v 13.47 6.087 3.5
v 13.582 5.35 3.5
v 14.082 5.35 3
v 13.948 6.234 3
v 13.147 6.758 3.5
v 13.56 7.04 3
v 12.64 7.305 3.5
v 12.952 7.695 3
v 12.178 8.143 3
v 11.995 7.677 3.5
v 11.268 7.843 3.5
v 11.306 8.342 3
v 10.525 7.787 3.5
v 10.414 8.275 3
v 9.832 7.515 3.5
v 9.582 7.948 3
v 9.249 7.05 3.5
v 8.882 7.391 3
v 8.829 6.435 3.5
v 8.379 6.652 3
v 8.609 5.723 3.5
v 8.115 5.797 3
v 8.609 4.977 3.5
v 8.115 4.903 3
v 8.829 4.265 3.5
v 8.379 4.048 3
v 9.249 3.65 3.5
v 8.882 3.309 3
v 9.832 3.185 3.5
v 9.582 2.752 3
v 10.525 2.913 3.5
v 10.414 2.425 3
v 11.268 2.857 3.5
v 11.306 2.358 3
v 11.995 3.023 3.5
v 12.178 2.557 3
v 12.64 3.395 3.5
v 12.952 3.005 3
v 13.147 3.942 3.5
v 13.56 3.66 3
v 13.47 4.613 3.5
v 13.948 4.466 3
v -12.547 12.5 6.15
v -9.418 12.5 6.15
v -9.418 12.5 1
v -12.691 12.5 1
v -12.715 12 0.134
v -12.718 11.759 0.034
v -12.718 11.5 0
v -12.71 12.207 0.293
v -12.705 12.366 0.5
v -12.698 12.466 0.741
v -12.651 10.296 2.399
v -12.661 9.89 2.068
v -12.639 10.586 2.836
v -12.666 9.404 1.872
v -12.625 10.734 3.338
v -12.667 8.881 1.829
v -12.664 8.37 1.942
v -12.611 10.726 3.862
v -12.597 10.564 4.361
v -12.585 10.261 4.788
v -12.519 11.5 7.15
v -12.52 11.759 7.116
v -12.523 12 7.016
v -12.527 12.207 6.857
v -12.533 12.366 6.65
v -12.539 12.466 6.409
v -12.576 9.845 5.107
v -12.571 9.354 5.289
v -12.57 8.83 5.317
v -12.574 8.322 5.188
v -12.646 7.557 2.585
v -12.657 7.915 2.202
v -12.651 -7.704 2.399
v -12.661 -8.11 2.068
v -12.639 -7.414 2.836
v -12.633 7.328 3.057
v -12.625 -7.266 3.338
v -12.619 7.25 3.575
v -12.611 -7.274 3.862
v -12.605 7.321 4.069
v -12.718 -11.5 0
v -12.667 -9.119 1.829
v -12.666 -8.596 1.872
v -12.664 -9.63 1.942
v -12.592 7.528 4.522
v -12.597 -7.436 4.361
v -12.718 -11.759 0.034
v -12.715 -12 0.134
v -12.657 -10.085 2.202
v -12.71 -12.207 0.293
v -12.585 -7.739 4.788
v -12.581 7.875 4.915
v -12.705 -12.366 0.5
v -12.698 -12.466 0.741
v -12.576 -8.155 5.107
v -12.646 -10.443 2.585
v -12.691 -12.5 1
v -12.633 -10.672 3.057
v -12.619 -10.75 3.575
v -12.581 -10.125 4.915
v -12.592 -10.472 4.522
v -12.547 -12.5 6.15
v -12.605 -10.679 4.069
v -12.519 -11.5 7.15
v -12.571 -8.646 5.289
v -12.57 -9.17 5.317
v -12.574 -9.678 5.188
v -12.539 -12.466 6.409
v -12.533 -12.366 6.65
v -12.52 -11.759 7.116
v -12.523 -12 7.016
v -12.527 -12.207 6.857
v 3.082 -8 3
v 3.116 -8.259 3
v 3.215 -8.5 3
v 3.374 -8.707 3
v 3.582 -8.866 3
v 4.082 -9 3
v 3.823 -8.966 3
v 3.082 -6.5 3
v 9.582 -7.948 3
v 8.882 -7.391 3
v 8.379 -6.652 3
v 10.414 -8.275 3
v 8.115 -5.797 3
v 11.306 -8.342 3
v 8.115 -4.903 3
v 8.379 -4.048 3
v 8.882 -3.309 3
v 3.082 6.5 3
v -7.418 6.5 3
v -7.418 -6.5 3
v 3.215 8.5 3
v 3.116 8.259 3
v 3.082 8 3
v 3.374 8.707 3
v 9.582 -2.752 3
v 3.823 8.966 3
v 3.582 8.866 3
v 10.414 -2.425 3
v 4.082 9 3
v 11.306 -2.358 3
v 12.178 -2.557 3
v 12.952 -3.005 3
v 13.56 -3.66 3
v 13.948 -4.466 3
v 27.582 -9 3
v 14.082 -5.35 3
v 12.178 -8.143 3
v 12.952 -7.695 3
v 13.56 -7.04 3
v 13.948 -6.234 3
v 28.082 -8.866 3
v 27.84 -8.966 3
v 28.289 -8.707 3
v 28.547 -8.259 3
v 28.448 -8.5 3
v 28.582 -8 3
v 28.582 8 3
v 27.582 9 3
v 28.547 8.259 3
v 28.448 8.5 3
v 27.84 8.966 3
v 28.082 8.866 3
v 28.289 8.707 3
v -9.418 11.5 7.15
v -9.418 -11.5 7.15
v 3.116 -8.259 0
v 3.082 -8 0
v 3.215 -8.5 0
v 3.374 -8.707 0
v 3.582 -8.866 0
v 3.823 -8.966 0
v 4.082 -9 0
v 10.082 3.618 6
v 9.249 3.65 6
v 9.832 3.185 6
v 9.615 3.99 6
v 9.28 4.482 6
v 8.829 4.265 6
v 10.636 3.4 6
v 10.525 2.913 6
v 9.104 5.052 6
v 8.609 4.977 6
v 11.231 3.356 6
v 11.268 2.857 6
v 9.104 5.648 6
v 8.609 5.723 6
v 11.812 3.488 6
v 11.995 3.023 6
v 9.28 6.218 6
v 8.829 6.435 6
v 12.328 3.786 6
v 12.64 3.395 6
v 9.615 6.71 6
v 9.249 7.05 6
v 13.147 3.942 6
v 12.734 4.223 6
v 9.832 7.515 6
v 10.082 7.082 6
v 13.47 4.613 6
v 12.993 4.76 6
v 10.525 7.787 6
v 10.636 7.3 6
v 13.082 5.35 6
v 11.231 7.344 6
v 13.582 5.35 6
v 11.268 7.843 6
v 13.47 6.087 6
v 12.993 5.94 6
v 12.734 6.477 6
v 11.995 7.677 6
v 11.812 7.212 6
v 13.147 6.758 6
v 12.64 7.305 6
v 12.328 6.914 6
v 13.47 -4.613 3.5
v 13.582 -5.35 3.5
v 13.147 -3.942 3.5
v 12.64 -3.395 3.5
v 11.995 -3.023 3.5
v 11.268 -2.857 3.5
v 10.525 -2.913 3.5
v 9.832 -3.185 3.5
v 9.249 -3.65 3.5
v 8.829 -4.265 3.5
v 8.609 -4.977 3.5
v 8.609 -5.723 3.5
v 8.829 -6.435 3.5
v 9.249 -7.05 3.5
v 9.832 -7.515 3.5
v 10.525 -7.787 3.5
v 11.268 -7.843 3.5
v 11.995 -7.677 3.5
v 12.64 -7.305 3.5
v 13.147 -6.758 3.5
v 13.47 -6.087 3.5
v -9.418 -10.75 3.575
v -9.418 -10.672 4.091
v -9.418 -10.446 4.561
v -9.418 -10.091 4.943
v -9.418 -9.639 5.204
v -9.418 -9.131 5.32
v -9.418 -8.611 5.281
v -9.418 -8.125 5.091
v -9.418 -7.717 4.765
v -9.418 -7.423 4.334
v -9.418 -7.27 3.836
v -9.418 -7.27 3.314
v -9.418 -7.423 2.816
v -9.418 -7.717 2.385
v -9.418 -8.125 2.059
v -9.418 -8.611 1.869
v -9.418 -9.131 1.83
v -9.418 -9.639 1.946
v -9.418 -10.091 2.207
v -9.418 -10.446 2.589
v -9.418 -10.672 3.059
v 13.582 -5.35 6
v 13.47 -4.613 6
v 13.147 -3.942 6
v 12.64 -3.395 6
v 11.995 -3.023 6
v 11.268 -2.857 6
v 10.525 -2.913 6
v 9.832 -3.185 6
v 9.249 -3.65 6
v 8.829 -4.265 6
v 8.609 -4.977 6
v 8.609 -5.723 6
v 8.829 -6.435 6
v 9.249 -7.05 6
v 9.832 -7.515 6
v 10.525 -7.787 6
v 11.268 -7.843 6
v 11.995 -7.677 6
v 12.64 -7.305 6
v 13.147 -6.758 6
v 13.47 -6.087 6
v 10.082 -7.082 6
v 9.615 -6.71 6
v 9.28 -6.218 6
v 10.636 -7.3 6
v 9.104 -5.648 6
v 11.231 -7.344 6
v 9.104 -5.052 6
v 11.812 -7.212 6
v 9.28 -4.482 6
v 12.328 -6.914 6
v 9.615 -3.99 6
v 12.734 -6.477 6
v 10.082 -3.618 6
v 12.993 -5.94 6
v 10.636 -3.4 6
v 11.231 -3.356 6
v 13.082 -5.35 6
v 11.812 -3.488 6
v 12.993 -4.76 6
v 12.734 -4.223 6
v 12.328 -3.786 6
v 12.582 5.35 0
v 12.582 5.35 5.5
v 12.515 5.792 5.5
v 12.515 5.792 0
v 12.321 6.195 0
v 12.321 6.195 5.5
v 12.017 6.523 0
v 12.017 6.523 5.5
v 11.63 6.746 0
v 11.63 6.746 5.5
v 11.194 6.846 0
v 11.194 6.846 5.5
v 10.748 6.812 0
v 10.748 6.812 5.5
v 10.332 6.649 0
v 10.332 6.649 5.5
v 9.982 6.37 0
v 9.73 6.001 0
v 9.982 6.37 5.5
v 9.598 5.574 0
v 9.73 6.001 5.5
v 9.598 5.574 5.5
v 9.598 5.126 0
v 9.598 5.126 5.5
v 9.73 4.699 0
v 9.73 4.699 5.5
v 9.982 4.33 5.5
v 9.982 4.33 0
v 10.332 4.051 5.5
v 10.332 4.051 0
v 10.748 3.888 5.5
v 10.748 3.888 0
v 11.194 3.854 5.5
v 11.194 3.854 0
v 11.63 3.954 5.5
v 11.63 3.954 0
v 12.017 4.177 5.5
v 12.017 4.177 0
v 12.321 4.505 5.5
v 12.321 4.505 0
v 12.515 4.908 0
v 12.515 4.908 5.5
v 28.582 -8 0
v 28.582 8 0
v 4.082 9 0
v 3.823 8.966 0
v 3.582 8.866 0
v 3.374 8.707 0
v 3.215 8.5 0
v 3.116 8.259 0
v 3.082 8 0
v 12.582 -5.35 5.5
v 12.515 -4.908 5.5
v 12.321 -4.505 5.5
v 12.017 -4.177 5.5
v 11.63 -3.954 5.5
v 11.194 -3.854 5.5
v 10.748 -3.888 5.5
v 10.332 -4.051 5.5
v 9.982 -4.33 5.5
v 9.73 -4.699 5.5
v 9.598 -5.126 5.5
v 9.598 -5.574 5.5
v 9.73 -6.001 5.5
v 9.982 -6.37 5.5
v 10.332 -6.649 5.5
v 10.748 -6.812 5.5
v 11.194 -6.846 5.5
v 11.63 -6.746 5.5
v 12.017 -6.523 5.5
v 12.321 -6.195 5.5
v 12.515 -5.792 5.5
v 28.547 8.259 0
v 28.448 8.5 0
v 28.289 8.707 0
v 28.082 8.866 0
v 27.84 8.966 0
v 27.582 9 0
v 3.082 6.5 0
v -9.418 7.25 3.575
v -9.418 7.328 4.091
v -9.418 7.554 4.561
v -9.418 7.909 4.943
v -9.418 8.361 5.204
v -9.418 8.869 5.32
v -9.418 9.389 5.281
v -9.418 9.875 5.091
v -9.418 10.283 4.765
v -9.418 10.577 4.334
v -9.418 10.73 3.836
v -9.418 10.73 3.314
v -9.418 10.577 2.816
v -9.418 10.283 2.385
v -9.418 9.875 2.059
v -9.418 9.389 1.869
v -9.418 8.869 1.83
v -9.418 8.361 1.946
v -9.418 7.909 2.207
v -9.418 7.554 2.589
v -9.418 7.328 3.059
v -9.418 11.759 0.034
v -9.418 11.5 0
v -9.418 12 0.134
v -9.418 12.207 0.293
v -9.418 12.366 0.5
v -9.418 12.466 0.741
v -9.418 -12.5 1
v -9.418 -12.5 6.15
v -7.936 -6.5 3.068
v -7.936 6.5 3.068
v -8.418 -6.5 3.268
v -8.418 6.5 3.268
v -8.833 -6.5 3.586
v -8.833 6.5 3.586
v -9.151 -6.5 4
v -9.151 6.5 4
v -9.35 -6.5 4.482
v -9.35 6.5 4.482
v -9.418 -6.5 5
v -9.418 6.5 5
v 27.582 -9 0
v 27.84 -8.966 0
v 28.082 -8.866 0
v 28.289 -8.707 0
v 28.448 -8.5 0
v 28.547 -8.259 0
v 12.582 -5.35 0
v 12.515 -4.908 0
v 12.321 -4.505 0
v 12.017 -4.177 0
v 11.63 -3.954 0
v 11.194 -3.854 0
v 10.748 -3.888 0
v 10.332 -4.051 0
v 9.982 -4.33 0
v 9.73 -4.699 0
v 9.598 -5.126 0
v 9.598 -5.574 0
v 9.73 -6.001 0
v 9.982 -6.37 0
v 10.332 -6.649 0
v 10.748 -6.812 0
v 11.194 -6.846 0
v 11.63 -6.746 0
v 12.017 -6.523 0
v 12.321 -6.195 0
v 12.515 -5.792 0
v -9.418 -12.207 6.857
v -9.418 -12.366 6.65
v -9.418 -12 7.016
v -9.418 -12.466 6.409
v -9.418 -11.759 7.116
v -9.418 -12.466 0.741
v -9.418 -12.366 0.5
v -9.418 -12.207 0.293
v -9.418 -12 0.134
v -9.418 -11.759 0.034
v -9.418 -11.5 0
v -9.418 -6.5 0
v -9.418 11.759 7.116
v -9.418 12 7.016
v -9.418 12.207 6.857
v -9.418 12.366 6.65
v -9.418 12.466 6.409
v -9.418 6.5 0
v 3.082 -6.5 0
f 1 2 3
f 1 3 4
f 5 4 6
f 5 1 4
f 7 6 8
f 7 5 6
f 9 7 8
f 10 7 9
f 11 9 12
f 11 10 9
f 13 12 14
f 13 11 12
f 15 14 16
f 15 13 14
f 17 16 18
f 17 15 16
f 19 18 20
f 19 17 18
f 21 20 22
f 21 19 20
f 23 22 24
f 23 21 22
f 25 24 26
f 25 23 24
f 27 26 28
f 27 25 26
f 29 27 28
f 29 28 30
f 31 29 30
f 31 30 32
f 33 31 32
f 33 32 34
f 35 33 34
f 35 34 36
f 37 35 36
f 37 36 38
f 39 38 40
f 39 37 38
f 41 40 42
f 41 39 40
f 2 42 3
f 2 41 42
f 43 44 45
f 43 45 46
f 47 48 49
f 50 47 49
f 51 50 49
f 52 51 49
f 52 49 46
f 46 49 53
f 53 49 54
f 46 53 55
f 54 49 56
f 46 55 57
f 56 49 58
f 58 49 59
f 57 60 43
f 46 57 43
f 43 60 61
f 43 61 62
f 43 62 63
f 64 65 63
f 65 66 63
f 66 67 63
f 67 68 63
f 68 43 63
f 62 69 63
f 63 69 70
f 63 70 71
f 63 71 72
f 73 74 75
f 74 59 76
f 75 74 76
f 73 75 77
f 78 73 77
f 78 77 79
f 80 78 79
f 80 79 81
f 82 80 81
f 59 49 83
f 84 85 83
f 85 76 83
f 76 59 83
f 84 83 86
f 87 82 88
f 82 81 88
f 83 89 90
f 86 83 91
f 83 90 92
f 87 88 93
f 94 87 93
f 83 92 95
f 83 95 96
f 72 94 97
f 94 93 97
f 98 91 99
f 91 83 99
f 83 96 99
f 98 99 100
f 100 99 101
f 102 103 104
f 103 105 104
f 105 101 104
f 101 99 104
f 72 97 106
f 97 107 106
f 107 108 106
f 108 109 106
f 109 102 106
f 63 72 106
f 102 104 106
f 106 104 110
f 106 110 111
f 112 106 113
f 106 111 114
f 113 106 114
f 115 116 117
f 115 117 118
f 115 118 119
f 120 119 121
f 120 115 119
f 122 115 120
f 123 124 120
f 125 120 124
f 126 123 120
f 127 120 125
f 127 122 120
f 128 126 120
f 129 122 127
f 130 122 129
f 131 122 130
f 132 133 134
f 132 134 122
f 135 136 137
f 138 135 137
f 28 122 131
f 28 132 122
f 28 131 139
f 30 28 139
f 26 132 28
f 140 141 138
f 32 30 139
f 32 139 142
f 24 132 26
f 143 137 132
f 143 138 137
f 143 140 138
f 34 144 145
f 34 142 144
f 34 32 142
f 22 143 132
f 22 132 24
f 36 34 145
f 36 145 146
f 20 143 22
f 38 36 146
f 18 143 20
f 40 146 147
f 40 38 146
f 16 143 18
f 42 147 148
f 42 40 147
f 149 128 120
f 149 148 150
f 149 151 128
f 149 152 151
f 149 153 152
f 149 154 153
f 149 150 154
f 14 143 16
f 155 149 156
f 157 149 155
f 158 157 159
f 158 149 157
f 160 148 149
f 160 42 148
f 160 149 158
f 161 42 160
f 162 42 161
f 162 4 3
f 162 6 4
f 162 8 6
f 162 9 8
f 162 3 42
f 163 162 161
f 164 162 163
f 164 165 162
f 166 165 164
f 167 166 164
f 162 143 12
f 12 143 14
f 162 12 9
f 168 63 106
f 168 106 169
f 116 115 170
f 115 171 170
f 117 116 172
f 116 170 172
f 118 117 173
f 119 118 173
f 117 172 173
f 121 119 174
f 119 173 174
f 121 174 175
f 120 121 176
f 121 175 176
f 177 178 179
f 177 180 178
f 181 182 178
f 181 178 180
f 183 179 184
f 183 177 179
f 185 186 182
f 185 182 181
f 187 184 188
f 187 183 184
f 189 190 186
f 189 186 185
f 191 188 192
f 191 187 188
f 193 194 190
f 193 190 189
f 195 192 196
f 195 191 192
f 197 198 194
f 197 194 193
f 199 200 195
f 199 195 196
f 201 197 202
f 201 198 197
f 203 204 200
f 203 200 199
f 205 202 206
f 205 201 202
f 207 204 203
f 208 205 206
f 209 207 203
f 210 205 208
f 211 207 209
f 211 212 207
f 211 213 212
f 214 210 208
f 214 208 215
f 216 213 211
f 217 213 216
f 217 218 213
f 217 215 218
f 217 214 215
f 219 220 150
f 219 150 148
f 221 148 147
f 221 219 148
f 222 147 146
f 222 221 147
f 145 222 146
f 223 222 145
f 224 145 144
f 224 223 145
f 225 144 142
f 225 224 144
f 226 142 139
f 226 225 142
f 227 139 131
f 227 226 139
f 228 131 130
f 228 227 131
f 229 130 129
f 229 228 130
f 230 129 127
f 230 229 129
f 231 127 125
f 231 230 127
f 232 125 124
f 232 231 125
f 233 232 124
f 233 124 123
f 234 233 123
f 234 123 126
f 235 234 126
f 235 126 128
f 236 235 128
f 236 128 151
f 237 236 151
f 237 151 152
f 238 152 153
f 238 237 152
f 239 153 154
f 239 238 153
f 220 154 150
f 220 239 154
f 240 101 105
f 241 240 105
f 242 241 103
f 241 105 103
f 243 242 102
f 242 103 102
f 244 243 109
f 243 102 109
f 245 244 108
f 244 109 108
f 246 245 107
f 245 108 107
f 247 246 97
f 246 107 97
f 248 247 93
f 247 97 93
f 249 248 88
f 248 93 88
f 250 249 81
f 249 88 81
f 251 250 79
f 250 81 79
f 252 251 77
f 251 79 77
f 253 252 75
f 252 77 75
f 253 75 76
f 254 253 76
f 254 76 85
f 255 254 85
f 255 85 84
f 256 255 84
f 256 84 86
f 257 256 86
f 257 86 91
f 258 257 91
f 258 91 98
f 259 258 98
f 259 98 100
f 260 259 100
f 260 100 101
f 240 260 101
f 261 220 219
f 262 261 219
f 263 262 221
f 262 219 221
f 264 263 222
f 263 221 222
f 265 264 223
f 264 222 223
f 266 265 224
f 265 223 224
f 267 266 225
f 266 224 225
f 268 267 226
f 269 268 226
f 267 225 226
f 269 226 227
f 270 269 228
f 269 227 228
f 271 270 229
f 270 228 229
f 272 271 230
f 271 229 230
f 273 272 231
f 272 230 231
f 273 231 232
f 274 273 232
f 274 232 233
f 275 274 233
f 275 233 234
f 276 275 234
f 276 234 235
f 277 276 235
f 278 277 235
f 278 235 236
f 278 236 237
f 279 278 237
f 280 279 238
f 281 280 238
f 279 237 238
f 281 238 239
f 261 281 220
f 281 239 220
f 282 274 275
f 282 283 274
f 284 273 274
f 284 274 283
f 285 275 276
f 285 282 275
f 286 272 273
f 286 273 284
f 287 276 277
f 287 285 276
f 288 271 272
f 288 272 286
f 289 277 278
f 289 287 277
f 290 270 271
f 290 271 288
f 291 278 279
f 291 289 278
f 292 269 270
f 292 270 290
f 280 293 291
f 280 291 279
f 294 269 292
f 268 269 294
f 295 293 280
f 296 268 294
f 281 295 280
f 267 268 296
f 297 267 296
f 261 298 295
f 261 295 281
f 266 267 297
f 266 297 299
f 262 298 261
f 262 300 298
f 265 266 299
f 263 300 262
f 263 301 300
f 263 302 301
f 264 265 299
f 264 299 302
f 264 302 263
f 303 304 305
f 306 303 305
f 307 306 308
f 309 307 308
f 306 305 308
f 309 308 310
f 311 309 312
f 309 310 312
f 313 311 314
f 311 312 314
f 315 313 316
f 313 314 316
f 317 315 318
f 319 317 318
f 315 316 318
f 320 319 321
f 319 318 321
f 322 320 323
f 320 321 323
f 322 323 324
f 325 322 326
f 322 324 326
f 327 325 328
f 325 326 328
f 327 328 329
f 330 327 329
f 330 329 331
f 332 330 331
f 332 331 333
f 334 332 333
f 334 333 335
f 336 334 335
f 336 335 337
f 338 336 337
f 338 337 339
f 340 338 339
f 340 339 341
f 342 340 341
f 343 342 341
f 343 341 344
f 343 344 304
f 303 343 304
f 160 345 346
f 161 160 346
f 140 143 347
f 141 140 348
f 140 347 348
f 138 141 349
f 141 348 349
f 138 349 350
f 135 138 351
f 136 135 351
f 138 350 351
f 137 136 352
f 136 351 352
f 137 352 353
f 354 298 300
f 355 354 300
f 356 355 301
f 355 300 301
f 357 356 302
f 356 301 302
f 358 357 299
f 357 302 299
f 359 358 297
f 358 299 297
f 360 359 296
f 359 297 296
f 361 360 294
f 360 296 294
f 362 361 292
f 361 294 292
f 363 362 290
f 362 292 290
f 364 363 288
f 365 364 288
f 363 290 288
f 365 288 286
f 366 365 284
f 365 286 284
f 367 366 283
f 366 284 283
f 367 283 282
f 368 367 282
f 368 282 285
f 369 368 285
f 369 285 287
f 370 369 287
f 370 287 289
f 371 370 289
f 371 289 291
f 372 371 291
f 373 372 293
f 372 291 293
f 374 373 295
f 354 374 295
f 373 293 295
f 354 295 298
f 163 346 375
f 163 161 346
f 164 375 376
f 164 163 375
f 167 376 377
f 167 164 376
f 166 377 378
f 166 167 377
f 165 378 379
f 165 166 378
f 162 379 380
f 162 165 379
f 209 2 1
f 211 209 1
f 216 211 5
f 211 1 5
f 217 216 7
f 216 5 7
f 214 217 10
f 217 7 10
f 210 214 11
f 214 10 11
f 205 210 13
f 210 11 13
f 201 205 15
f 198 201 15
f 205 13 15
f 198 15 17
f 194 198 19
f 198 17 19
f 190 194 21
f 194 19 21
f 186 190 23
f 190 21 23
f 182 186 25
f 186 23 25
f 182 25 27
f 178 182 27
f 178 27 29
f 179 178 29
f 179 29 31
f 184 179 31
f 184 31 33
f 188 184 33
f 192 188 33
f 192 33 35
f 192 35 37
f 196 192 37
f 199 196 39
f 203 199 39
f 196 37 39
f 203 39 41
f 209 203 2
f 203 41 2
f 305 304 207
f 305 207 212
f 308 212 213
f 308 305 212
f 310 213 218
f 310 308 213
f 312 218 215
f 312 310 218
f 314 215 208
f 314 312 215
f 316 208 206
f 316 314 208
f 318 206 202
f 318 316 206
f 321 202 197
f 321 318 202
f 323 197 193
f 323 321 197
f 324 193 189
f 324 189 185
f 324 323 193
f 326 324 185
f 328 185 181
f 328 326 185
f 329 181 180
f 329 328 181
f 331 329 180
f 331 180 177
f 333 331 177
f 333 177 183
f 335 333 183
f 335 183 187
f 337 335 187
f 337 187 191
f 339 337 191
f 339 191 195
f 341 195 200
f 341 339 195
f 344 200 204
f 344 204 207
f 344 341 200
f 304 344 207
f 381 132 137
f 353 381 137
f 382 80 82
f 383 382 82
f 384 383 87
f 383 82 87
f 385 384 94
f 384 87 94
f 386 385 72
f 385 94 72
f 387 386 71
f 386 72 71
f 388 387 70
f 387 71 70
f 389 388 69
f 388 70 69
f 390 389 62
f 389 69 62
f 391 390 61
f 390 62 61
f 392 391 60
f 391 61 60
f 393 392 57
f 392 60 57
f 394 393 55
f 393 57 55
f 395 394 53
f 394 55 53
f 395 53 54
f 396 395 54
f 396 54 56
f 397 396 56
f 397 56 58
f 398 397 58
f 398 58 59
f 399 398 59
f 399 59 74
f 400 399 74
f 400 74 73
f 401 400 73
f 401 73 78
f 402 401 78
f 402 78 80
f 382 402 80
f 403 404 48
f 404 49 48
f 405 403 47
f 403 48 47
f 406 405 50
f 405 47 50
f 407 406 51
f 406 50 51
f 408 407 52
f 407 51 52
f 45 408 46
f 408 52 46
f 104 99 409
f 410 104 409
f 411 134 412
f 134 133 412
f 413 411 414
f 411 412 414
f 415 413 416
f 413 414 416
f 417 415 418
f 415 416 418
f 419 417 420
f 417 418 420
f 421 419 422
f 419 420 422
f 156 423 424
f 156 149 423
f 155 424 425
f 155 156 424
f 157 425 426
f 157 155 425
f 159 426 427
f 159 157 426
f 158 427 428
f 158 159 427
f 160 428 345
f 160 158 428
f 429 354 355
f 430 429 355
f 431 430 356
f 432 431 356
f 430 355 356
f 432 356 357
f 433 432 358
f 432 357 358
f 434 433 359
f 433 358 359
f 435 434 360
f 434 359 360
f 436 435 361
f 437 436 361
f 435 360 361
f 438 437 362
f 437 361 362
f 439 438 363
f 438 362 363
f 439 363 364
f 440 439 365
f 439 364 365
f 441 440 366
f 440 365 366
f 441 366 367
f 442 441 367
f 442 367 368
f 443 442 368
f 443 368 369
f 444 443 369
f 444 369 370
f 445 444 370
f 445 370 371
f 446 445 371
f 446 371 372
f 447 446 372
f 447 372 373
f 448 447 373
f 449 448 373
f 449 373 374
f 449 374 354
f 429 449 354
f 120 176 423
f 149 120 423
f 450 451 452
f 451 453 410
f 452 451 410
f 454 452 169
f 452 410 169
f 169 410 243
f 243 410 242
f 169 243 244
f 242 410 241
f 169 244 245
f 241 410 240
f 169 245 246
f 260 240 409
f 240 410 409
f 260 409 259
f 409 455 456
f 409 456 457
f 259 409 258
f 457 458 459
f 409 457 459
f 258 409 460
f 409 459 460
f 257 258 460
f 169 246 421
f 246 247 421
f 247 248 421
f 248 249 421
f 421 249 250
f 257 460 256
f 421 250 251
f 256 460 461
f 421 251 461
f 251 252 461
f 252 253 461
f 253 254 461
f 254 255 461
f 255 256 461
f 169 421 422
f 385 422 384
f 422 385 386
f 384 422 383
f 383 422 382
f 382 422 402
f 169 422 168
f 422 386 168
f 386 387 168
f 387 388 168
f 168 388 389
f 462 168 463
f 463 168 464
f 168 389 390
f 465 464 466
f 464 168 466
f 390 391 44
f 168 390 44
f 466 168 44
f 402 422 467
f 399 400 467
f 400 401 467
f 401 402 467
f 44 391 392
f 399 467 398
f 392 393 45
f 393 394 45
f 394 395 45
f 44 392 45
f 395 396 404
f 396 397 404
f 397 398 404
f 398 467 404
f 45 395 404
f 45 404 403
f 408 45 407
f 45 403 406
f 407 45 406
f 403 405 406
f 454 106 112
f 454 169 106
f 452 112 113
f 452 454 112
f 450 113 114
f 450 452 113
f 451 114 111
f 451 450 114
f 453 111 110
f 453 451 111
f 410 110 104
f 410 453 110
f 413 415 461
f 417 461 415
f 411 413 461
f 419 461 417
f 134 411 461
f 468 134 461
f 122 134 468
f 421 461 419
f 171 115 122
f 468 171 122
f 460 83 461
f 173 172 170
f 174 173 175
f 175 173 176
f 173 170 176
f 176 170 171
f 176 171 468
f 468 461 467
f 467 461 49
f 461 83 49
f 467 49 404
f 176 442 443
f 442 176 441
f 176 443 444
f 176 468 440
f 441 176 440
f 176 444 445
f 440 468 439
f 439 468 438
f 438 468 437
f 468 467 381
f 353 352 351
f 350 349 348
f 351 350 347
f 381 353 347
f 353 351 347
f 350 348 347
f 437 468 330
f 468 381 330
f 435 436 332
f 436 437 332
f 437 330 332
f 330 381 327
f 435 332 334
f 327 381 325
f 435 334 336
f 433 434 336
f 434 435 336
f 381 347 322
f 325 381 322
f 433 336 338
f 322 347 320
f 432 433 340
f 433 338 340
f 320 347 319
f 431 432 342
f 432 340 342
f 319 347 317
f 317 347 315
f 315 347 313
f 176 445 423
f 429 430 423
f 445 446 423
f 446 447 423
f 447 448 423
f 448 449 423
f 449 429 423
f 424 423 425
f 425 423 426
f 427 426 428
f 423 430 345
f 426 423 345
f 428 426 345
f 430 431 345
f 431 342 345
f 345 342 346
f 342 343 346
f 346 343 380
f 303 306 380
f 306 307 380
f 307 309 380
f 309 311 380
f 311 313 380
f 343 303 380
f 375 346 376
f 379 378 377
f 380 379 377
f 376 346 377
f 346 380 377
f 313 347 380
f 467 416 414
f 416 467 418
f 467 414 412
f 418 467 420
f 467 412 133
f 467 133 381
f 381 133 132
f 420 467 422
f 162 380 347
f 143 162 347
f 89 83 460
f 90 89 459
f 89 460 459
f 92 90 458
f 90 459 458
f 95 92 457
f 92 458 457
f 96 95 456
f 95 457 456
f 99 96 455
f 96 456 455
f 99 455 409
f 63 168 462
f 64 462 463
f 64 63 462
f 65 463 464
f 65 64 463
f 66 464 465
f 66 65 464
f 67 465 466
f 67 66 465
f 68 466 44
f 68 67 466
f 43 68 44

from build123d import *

# Parameters (mm, degrees)
PAD006_DEPTH    = 7.15
SKETCH012_W     = 38
SKETCH012_H     = 18
POCKET004_DEPTH = 4.15
SKETCH013_R     = 2.5
PAD007_DEPTH    = 3
SKETCH014_R     = 1.5
POCKET005_DEPTH = 6.001
SKETCH016_W     = 12.5
SKETCH016_H     = 2.5
POCKET006_DEPTH = 5
SKETCH017_R     = 1.75
POCKET007_DEPTH = 5
CHAMFER_SIZE    = 0.5
CHAMFER001_SIZE = 0.5
POCKET008_DEPTH = 25.001
FILLET_R        = 2
FILLET001_R     = 1
FILLET002_R     = 1


with BuildPart() as part:
    # Sketch011 (on XY_Plane001 of Origin002) → Pad006 (new body)
    with BuildSketch(Plane.XY):
        Polygon((-9.418493, -9), (28.581507, -9), (28.581507, 9), (-9.418493, 9), (-9.418493, 12.5), (-12.718493, 12.5), (-12.718493, -12.5), (-9.418493, -12.5), align=None)
    extrude(amount=PAD006_DEPTH)

    # Sketch012 (on Face10 of Pad006) → Pocket004 (cut)
    with BuildSketch(Plane.XY.offset(7.15)):
        with Locations((9.581507, 0)):
            Rectangle(SKETCH012_W, SKETCH012_H)
    extrude(amount=-POCKET004_DEPTH, mode=Mode.SUBTRACT)

    # Sketch013 (on Face4 of Pocket004) → Pad007 (join)
    with BuildSketch(Plane.XY.offset(3)):
        with Locations((11.081507, 5.35)):
            Circle(SKETCH013_R)
        with Locations((11.081507, -5.35)):
            Circle(SKETCH013_R)
    extrude(amount=PAD007_DEPTH)

    # Sketch014 (on Face13 of Pad007) → Pocket005 (cut, through all)
    with BuildSketch(Plane.XY.offset(6)):
        with Locations((11.081507, 5.35)):
            Circle(SKETCH014_R)
        with Locations((11.081507, -5.35)):
            Circle(SKETCH014_R)
    extrude(amount=-POCKET005_DEPTH, mode=Mode.SUBTRACT)

    # Sketch016 (on Face4 of Pocket005) → Pocket006 (cut)
    with BuildSketch(Plane.XY.offset(3)):
        with Locations((-3.168493, 7.75)):
            Rectangle(SKETCH016_W, SKETCH016_H)
        with Locations((-3.168493, -7.75)):
            Rectangle(SKETCH016_W, SKETCH016_H)
    extrude(amount=-POCKET006_DEPTH, mode=Mode.SUBTRACT)

    # Sketch017 (on Face7 of Pocket006) → Pocket007 (cut)
    with BuildSketch(Plane(origin=(-12.718493, 0, 0), x_dir=(0, -1, 0), z_dir=(-1, 0, 0))):
        with Locations((-9, 3.575)):
            Circle(SKETCH017_R)
        with Locations((9, 3.575)):
            Circle(SKETCH017_R)
    extrude(amount=-POCKET007_DEPTH, mode=Mode.SUBTRACT)

    # Chamfer
    chamfer_edges = [part.edges().sort_by_distance(p)[0] for p in [
        (8.581507, 5.35, 3),
        (8.581507, -5.35, 3),
    ]]
    chamfer(chamfer_edges, length=CHAMFER_SIZE)

    # Chamfer001
    chamfer001_edges = [part.edges().sort_by_distance(p)[0] for p in [
        (9.581507, -5.35, 6),
        (9.581507, 5.35, 6),
    ]]
    chamfer(chamfer001_edges, length=CHAMFER001_SIZE)

    # Sketch018 (on Face8 of Chamfer001) → Pocket008 (cut, through all)
    with BuildSketch(Plane.XZ.offset(12.5)):
        Polygon((-12.718493, 7.15), (-12.718493, 0), (-12.518776, 7.15), align=None)
    extrude(amount=-POCKET008_DEPTH, mode=Mode.SUBTRACT)

    # Fillet
    fillet_edges = [part.edges().sort_by_distance(p)[0] for p in [
        (-9.418493, 0, 3),
    ]]
    fillet(fillet_edges, radius=FILLET_R)

    # Fillet001
    fillet001_edges = [part.edges().sort_by_distance(p)[0] for p in [
        (-10.968635, -12.5, 7.15),
        (-10.968635, 12.5, 7.15),
        (-11.068493, -12.5, 0),
        (-11.068493, 12.5, 0),
    ]]
    fillet(fillet001_edges, radius=FILLET001_R)

    # Fillet002
    fillet002_edges = [part.edges().sort_by_distance(p)[0] for p in [
        (3.081507, -9, 1.5),
        (28.581507, -9, 1.5),
        (28.581507, 9, 1.5),
        (3.081507, 9, 1.5),
    ]]
    fillet(fillet002_edges, radius=FILLET002_R)


solid = part.part
